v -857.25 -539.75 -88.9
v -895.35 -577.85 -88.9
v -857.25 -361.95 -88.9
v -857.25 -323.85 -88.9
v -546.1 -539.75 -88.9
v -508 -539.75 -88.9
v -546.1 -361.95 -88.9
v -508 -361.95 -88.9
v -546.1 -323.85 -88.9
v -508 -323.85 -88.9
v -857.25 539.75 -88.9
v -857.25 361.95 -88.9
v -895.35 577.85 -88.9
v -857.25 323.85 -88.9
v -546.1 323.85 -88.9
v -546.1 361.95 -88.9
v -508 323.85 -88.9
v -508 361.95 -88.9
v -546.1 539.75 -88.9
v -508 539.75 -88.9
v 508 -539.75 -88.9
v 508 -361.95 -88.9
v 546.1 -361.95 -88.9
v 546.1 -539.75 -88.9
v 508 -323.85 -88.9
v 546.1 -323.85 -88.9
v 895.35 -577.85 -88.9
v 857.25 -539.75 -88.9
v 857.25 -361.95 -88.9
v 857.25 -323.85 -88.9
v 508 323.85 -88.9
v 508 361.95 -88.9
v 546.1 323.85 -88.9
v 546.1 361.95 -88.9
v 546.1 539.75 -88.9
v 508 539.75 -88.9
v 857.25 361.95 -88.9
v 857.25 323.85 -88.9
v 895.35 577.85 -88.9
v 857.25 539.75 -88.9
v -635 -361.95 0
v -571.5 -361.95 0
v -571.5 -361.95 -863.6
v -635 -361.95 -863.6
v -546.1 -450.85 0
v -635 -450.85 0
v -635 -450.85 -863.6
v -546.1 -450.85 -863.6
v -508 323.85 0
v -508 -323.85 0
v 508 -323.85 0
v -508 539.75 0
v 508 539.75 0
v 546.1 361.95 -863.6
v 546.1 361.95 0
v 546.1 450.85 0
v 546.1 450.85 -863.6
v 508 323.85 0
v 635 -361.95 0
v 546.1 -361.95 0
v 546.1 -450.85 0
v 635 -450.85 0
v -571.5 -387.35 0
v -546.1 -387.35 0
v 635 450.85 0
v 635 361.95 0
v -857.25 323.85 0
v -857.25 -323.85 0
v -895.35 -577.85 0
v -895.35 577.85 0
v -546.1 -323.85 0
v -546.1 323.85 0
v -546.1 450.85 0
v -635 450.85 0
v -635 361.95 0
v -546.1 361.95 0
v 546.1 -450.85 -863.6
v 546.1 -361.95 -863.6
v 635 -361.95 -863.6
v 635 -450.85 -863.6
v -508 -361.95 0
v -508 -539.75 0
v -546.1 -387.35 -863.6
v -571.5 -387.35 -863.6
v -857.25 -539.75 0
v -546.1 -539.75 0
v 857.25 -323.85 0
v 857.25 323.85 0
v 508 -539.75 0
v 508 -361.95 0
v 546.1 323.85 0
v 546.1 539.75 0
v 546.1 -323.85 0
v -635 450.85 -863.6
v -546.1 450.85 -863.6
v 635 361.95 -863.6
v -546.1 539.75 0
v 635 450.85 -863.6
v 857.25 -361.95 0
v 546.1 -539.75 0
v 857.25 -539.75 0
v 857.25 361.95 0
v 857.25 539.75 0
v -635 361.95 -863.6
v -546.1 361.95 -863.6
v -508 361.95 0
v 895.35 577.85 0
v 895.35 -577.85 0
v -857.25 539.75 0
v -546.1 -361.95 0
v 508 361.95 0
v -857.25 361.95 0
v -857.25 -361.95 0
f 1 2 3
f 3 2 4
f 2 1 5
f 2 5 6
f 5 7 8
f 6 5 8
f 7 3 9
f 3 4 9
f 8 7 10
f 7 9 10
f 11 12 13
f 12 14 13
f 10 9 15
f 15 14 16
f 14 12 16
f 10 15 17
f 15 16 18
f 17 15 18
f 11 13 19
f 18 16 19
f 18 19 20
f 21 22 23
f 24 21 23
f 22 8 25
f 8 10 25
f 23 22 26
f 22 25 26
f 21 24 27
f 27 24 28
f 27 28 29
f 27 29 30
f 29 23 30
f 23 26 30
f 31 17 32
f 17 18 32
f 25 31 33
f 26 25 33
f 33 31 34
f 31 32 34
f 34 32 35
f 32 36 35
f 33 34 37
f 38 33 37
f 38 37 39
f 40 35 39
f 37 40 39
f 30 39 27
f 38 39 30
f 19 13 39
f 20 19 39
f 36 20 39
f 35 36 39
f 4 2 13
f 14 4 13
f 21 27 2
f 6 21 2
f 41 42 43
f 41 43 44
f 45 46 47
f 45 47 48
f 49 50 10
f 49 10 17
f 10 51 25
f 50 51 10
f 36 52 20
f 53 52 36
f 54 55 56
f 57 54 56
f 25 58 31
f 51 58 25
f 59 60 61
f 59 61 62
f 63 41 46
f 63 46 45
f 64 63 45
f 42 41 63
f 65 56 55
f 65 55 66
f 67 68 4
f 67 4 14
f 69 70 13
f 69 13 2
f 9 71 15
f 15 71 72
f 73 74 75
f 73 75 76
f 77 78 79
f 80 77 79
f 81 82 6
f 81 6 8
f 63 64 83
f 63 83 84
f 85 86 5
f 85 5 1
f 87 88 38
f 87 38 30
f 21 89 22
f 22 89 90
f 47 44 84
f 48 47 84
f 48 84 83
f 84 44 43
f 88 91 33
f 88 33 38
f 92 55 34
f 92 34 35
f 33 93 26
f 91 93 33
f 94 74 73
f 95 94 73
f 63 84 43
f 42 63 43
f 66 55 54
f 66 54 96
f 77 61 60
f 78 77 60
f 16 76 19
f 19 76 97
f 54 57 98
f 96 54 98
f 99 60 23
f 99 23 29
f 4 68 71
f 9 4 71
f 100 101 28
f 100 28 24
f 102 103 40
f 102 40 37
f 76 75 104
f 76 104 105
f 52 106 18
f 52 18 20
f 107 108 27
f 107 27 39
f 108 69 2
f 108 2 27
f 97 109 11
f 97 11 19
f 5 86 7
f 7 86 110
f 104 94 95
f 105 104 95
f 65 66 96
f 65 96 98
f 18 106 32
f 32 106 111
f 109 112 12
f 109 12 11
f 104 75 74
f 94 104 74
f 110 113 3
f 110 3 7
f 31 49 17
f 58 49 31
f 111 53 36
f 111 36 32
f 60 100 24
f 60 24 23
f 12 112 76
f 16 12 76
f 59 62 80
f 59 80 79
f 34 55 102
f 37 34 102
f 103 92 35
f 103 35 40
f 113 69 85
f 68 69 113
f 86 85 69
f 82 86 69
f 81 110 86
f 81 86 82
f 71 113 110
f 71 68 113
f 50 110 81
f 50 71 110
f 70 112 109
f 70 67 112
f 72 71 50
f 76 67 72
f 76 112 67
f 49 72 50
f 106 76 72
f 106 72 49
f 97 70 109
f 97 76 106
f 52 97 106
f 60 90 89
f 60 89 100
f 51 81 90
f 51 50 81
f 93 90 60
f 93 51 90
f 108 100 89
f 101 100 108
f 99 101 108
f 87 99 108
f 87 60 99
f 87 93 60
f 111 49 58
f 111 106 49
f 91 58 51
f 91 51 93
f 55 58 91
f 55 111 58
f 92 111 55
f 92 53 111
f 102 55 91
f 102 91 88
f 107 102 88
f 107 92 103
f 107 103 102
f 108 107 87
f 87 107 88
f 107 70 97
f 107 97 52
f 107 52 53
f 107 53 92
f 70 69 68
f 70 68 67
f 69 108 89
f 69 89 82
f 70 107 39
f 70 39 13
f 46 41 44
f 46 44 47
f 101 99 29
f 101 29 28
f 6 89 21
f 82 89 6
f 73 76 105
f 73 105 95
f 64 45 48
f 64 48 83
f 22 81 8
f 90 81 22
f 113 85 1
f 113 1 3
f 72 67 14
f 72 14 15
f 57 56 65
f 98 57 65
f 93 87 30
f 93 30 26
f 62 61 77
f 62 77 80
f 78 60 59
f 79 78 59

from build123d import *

# Parameters (mm, degrees)
F0_W     = 38.1
F0_H     = 38.1
F0_W_2   = 1016
F0_H_2   = 647.7
F0_W_3   = 311.15
F0_H_3   = 177.8
F1_DEPTH = 88.9
F3_DEPTH = 863.6
F2_W     = 88.9
F2_H     = 88.9


with BuildPart() as f1:
    # F0 (on Top) → F1 (new body)
    with BuildSketch(Plane.XY):
        with Locations((527.05, 558.8)):
            Rectangle(F0_W, F0_H)
        with Locations((0, 558.8)):
            Rectangle(F0_W_2, F0_H)
        with Locations((876.3, 0)):
            Rectangle(F0_W, F0_H_2)
        with Locations((876.3, 342.9)):
            Rectangle(F0_W, F0_H)
        with Locations((-876.3, 342.9)):
            Rectangle(F0_W, F0_H)
        with Locations((-876.3, 0)):
            Rectangle(F0_W, F0_H_2)
        with Locations((-527.05, 558.8)):
            Rectangle(F0_W, F0_H)
        with Locations((0, -558.8)):
            Rectangle(F0_W_2, F0_H)
        with Locations((527.05, -558.8)):
            Rectangle(F0_W, F0_H)
        with Locations((876.3, -342.9)):
            Rectangle(F0_W, F0_H)
        Polygon((546.1, 577.85), (546.1, 539.75), (857.25, 539.75), (857.25, 361.95), (895.35, 361.95), (895.35, 577.85), align=None)
        with Locations((-876.3, -342.9)):
            Rectangle(F0_W, F0_H)
        with Locations((-527.05, -558.8)):
            Rectangle(F0_W, F0_H)
        Polygon((-895.35, 361.95), (-857.25, 361.95), (-857.25, 539.75), (-546.1, 539.75), (-546.1, 577.85), (-895.35, 577.85), align=None)
        Polygon((857.25, -539.75), (546.1, -539.75), (546.1, -577.85), (895.35, -577.85), (895.35, -361.95), (857.25, -361.95), align=None)
        Polygon((-857.25, -539.75), (-857.25, -361.95), (-895.35, -361.95), (-895.35, -577.85), (-546.1, -577.85), (-546.1, -539.75), align=None)
        with Locations((-701.675, 342.9)):
            Rectangle(F0_W_3, F0_H)
        with Locations((-527.05, 450.85)):
            Rectangle(F0_W, F0_H_3)
        with Locations((-527.05, 342.9)):
            Rectangle(F0_W, F0_H)
        with Locations((-527.05, 0)):
            Rectangle(F0_W, F0_H_2)
        with Locations((-701.675, -342.9)):
            Rectangle(F0_W_3, F0_H)
        with Locations((-527.05, -450.85)):
            Rectangle(F0_W, F0_H_3)
        with Locations((-527.05, -342.9)):
            Rectangle(F0_W, F0_H)
        with Locations((0, -342.9)):
            Rectangle(F0_W_2, F0_H)
        with Locations((527.05, -450.85)):
            Rectangle(F0_W, F0_H_3)
        with Locations((527.05, -342.9)):
            Rectangle(F0_W, F0_H)
        with Locations((701.675, -342.9)):
            Rectangle(F0_W_3, F0_H)
        with Locations((527.05, 0)):
            Rectangle(F0_W, F0_H_2)
        with Locations((527.05, 342.9)):
            Rectangle(F0_W, F0_H)
        with Locations((527.05, 450.85)):
            Rectangle(F0_W, F0_H_3)
        with Locations((701.675, 342.9)):
            Rectangle(F0_W_3, F0_H)
        with Locations((0, 342.9)):
            Rectangle(F0_W_2, F0_H)
    extrude(amount=-F1_DEPTH)


with BuildPart() as f3:
    # F2 (on face) → F3 (new body)
    with BuildSketch(Plane.XY):
        Polygon((-571.5, -387.35), (-571.5, -361.95), (-635, -361.95), (-635, -450.85), (-546.1, -450.85), (-546.1, -387.35), align=None)
    extrude(amount=-F3_DEPTH)


with BuildPart() as f3b:
    # F2 (on face) → F3, piece 2 (new body)
    with BuildSketch(Plane.XY):
        with Locations((590.55, -406.4)):
            Rectangle(F2_W, F2_H)
    extrude(amount=-F3_DEPTH)


with BuildPart() as f3c:
    # F2 (on face) → F3, piece 3 (new body)
    with BuildSketch(Plane.XY):
        with Locations((590.55, 406.4)):
            Rectangle(F2_W, F2_H)
    extrude(amount=-F3_DEPTH)


with BuildPart() as f3d:
    # F2 (on face) → F3, piece 4 (new body)
    with BuildSketch(Plane.XY):
        with Locations((-590.55, 406.4)):
            Rectangle(F2_W, F2_H)
    extrude(amount=-F3_DEPTH)


solid = Compound([f1.part, f3.part, f3b.part, f3c.part, f3d.part])
